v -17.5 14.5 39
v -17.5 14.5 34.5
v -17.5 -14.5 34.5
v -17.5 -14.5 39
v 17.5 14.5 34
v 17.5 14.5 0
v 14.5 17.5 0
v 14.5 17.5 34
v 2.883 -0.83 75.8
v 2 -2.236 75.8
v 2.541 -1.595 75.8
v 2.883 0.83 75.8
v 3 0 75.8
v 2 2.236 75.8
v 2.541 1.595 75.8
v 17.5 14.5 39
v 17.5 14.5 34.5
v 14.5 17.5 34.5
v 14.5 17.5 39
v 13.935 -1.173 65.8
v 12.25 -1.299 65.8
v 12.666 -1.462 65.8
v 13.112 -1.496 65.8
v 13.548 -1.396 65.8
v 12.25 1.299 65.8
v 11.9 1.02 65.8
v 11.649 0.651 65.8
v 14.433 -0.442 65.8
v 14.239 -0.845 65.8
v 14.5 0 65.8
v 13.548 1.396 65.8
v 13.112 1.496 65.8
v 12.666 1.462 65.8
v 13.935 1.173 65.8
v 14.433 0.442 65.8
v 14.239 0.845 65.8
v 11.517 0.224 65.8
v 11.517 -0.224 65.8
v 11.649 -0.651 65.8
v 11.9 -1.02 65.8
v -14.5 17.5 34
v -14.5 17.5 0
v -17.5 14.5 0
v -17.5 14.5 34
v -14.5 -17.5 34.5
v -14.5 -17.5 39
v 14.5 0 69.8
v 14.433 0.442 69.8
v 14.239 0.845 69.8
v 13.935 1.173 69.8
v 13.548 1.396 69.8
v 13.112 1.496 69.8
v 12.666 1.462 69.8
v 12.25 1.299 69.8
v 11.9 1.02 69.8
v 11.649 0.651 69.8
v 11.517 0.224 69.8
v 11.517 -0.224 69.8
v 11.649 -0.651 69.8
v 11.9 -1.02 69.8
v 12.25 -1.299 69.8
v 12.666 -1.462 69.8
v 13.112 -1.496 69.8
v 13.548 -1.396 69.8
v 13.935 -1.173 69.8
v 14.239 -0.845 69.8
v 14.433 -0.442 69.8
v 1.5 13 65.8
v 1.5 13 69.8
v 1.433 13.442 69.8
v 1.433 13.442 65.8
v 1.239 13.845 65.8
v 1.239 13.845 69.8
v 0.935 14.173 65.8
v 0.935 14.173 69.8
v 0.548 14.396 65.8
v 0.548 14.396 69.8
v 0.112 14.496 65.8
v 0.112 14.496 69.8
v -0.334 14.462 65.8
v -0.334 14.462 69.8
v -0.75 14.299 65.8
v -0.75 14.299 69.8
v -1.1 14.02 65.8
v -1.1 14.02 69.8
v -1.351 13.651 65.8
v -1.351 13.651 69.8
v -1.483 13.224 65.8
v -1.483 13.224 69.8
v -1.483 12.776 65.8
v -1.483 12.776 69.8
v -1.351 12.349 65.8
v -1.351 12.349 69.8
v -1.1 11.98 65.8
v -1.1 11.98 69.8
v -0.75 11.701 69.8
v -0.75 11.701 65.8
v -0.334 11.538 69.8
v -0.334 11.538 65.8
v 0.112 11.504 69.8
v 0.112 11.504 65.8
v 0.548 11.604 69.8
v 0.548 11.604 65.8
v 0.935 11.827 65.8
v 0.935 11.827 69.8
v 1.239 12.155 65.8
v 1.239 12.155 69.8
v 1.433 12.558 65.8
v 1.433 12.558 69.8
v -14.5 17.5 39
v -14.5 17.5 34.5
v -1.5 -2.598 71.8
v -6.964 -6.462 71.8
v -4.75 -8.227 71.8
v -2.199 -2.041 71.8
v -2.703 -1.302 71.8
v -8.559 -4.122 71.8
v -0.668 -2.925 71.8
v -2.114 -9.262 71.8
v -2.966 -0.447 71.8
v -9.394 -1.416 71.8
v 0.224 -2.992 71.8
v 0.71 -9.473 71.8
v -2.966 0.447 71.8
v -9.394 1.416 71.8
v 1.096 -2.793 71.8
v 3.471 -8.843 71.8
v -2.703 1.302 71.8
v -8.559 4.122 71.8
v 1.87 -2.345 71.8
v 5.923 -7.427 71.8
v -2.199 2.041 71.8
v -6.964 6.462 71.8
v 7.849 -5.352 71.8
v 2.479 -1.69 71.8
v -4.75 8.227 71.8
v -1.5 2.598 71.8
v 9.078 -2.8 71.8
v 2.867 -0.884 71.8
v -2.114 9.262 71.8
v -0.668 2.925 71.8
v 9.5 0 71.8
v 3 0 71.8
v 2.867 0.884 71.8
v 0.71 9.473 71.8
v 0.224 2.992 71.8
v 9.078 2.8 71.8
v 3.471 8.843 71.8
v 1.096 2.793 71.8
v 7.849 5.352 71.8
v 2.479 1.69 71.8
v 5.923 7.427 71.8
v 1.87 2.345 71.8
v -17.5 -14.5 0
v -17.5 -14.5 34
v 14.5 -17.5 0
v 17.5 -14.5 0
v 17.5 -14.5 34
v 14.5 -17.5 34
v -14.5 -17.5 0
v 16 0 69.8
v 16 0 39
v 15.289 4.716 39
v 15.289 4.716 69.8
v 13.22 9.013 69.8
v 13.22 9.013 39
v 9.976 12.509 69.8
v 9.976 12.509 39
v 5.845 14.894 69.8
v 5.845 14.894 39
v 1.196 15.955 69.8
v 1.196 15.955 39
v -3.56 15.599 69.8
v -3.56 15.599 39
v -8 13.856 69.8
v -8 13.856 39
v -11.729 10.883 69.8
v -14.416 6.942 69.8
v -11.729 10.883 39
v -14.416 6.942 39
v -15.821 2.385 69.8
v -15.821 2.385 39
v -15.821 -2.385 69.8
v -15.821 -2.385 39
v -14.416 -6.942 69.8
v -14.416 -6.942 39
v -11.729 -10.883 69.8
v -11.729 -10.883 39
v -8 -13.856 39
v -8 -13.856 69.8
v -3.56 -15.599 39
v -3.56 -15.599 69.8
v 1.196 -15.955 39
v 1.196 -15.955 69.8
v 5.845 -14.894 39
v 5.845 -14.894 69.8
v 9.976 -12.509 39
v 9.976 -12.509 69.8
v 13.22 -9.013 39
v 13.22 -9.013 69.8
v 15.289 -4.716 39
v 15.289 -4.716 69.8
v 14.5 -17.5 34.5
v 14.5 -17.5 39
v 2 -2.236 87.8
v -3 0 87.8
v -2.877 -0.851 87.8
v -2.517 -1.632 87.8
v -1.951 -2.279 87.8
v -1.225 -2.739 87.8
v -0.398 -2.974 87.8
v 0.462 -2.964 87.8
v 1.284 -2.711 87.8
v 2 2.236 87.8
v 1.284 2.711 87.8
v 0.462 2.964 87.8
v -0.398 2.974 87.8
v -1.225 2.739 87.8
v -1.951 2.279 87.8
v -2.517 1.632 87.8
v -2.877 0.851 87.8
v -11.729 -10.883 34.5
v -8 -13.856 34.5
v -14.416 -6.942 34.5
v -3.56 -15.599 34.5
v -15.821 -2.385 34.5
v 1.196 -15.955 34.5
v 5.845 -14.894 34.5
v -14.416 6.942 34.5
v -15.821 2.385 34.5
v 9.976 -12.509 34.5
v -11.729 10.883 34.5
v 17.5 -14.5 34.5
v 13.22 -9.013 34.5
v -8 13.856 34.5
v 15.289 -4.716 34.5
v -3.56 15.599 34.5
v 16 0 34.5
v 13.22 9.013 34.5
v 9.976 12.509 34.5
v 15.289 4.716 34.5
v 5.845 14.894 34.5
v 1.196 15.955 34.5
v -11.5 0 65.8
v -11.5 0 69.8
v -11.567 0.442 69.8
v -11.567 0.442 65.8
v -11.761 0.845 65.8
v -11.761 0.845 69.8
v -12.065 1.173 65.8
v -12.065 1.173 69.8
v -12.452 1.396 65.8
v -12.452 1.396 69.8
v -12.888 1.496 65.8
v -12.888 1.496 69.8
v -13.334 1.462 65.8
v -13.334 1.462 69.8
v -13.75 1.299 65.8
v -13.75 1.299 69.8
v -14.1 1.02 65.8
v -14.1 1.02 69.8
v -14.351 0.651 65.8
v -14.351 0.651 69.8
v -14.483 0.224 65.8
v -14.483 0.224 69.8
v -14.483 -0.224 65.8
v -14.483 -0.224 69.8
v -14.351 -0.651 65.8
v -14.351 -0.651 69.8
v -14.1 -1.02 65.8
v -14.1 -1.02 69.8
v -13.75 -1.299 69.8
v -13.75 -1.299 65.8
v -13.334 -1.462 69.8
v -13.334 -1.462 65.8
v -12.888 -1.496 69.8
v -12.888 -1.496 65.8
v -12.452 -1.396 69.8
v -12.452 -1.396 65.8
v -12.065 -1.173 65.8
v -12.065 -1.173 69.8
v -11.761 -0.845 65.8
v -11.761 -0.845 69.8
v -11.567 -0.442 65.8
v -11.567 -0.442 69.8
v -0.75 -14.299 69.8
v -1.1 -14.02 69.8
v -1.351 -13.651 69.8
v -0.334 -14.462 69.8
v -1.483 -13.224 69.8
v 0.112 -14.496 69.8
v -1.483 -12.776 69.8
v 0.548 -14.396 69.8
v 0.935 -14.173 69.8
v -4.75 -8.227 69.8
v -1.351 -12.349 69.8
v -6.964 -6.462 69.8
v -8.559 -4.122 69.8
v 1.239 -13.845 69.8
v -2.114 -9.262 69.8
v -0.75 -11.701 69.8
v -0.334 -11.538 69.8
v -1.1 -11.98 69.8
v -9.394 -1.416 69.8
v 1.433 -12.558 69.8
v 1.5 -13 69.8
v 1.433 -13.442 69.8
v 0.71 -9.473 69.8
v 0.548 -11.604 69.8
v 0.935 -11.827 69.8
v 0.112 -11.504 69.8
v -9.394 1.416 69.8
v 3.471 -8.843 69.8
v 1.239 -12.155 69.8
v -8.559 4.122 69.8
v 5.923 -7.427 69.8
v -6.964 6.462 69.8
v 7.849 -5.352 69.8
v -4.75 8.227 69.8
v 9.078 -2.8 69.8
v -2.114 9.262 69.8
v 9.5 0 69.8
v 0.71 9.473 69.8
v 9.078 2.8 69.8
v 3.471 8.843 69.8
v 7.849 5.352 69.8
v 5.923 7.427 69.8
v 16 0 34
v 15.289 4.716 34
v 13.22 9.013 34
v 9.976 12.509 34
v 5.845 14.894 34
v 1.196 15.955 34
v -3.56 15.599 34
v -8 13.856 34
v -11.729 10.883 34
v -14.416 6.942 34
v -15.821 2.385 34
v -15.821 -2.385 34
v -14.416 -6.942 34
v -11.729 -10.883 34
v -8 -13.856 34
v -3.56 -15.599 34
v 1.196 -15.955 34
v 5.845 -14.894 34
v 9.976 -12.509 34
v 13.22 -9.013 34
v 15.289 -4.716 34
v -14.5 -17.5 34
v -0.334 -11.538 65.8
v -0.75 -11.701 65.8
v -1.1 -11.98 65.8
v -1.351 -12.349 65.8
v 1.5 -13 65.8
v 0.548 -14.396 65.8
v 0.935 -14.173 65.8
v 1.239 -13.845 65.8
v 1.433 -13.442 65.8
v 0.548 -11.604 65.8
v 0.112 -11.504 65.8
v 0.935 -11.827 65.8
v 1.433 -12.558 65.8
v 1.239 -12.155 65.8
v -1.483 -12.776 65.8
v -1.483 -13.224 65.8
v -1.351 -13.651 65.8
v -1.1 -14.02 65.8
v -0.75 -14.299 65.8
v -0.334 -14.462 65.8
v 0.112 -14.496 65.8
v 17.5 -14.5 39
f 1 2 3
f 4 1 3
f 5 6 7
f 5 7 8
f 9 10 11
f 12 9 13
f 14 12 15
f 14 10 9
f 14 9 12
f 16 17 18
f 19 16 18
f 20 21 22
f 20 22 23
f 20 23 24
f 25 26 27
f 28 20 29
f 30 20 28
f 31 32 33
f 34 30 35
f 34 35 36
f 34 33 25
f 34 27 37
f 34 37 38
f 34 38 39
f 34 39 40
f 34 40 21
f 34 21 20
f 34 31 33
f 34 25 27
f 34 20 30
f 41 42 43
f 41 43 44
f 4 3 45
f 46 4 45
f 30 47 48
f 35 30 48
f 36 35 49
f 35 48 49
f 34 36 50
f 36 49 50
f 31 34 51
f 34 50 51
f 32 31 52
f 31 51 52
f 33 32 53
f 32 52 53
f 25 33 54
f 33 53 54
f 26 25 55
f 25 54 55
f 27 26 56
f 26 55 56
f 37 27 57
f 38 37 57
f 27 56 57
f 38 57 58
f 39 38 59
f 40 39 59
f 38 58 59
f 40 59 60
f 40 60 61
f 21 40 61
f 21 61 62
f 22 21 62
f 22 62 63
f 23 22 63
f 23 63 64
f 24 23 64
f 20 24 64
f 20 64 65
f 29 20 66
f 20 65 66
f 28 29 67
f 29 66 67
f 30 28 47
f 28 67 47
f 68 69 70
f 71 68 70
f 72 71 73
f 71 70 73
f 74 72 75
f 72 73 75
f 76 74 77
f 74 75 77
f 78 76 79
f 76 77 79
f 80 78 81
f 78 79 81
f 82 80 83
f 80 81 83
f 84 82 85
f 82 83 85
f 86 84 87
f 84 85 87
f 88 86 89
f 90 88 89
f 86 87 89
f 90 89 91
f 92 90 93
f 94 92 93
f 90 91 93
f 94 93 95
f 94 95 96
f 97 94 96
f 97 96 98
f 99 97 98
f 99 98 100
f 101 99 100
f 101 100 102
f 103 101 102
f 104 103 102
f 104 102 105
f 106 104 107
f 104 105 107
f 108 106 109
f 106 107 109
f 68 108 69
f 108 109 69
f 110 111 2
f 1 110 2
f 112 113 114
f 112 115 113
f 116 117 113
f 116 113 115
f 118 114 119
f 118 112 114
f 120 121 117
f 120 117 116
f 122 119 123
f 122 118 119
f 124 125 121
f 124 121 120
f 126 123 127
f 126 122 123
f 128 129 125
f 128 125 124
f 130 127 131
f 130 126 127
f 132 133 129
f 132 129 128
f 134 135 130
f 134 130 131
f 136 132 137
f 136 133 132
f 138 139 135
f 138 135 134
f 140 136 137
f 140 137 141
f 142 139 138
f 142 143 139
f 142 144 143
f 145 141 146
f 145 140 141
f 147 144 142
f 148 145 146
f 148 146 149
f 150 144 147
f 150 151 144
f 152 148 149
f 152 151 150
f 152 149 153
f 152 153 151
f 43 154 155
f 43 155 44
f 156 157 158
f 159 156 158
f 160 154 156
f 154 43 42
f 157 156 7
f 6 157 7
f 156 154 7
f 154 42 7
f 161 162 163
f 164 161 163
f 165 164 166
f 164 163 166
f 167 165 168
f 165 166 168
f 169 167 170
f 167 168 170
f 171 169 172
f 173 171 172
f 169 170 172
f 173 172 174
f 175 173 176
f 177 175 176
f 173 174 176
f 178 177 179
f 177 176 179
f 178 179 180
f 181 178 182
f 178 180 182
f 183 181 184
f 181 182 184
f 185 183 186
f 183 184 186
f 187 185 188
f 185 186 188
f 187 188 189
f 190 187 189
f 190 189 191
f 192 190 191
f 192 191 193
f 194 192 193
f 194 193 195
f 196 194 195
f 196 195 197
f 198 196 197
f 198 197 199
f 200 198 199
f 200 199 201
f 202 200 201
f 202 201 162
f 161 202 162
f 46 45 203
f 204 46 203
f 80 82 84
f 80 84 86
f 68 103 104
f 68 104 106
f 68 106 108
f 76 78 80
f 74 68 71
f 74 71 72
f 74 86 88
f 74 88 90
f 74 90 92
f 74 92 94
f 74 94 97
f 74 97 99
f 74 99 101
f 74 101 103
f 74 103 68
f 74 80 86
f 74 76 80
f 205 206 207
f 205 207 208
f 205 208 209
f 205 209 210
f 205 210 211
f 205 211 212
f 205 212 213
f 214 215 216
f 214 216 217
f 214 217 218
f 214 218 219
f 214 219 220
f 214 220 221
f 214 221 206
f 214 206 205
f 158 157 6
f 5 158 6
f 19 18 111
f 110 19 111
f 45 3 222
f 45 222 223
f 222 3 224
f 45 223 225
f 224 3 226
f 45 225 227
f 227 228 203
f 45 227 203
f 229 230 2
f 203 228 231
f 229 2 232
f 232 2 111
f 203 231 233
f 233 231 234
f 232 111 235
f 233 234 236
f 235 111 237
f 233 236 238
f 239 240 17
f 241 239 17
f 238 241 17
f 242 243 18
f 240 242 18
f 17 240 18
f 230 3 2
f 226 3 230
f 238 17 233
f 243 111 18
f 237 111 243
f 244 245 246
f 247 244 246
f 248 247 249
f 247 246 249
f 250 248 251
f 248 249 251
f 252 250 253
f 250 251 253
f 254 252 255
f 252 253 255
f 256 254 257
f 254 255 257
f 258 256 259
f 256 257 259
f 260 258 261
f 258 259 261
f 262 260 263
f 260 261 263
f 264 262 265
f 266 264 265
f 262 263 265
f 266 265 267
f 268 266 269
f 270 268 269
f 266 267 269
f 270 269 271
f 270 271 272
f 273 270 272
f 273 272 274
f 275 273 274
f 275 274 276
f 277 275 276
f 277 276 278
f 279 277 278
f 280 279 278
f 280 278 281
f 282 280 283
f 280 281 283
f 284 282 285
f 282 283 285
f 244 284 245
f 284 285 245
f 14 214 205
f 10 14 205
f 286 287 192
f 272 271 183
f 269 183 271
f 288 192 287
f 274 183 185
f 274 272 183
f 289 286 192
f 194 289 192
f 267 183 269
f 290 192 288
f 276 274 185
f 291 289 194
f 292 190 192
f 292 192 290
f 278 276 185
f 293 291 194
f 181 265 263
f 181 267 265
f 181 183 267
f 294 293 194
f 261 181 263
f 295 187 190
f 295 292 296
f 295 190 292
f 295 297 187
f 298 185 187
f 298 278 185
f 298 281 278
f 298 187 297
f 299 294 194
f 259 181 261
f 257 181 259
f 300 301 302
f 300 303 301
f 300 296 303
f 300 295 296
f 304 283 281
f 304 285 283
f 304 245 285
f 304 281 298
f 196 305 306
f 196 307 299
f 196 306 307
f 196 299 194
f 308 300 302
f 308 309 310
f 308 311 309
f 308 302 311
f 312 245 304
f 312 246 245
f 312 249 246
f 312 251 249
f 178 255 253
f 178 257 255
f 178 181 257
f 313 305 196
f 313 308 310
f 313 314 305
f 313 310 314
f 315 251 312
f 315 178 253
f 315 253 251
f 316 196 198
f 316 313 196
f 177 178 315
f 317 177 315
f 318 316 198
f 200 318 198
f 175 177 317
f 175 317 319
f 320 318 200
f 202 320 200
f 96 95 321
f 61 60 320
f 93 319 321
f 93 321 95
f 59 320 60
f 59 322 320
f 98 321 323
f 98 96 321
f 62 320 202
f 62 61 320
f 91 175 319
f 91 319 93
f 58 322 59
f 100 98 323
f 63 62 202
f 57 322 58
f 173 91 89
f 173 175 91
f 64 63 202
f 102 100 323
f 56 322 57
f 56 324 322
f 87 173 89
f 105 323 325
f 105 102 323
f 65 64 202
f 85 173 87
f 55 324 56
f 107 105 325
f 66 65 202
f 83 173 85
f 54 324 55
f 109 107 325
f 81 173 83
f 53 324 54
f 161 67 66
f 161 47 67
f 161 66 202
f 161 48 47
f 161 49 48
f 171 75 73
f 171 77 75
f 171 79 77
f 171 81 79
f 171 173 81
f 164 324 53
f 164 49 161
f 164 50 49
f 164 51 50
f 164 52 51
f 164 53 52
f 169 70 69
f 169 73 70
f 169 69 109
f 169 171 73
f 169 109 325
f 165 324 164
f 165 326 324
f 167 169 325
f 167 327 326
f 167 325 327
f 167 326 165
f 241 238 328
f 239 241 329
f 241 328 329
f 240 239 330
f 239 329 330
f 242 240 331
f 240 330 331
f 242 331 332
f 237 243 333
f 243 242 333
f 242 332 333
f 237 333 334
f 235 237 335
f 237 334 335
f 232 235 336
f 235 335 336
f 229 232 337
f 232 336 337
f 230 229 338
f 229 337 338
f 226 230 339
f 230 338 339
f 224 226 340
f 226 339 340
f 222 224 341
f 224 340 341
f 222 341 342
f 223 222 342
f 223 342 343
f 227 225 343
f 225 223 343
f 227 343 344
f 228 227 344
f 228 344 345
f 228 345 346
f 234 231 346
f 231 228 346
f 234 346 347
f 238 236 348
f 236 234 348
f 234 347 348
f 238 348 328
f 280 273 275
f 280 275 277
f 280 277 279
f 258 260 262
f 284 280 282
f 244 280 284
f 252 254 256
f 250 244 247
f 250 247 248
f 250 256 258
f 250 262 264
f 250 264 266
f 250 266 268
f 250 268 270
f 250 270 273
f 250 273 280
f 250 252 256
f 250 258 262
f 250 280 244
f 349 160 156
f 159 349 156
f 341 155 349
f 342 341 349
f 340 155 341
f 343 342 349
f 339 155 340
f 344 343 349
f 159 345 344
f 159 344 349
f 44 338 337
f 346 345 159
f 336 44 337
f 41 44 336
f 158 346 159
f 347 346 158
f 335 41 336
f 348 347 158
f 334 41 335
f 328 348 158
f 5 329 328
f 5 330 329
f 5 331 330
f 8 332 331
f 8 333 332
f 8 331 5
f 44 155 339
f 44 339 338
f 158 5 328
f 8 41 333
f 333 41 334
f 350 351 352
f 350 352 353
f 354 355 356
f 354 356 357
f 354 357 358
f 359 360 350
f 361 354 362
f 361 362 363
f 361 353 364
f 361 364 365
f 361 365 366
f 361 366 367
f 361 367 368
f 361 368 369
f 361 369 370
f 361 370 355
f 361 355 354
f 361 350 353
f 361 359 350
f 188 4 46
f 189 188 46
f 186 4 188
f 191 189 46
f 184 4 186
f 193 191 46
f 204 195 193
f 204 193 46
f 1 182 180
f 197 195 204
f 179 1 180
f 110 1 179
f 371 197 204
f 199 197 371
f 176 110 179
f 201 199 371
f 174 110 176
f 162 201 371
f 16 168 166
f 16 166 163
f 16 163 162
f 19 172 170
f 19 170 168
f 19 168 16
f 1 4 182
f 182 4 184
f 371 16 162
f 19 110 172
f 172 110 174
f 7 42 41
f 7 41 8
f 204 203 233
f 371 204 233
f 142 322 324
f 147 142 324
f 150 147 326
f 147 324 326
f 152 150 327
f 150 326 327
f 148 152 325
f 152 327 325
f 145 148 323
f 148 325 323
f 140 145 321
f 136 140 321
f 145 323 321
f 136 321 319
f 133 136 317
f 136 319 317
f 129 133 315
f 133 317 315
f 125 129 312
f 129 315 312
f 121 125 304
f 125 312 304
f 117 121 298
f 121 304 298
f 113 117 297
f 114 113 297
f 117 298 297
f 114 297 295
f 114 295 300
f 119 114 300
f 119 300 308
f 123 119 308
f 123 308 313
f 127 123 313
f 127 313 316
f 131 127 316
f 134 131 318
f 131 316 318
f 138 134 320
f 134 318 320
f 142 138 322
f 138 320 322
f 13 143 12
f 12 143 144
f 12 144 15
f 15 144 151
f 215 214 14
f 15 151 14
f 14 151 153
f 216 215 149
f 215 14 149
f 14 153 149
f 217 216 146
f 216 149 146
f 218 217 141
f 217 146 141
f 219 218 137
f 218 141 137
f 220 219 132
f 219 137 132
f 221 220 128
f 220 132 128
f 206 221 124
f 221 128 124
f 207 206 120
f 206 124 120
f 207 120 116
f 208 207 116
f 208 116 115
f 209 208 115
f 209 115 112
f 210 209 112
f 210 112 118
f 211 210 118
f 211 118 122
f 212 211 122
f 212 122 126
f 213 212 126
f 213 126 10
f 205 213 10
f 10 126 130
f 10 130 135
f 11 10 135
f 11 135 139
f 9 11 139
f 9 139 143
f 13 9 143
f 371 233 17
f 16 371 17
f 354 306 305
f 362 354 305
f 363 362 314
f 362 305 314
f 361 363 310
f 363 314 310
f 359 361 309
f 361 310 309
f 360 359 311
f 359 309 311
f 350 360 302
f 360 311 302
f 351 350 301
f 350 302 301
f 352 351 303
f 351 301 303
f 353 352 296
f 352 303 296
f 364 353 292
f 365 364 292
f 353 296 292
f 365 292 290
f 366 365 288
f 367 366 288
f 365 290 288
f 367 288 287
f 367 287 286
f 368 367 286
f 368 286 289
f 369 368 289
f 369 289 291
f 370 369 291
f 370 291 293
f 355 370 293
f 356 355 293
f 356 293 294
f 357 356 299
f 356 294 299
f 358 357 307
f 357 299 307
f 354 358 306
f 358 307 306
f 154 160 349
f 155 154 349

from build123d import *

# Parameters (mm, degrees)
SKIZZE1_W                       = 35
SKIZZE1_H                       = 35
AUFSATZ_LINEAR_AUSTRAGEN1_DEPTH = 34
SKIZZE2_R                       = 16
AUFSATZ_LINEAR_AUSTRAGEN2_DEPTH = 35.8
SKIZZE3_R                       = 9.5
AUFSATZ_LINEAR_AUSTRAGEN3_DEPTH = 2
SKIZZE4_R                       = 3
AUFSATZ_LINEAR_AUSTRAGEN4_DEPTH = 18
SKIZZE5_R                       = 1.5
SCHNITT_LINEAR_AUSTRAGEN1_DEPTH = 4
FASE1_SIZE                      = 3
AUFSATZ_LINEAR_START            = 0.5
AUFSATZ_LINEAR_AUSTRAGEN5_DEPTH = 4.5
SCHNITT_LINEAR_START            = -12
SCHNITT_LINEAR_AUSTRAGEN2_DEPTH = 12


with BuildPart() as part:
    # Skizze1 → Aufsatz-Linear austragen1 (new body)
    with BuildSketch(Plane.XY):
        Rectangle(SKIZZE1_W, SKIZZE1_H)
    extrude(amount=AUFSATZ_LINEAR_AUSTRAGEN1_DEPTH)

    # Skizze2 → Aufsatz-Linear austragen2 (add)
    with BuildSketch(Plane.XY.offset(34)):
        Circle(SKIZZE2_R)
    extrude(amount=AUFSATZ_LINEAR_AUSTRAGEN2_DEPTH)

    # Skizze3 → Aufsatz-Linear austragen3 (add)
    with BuildSketch(Plane.XY.offset(69.8)):
        Circle(SKIZZE3_R)
    extrude(amount=AUFSATZ_LINEAR_AUSTRAGEN3_DEPTH)

    # Skizze4 → Aufsatz-Linear austragen4 (add)
    with BuildSketch(Plane.XY.offset(69.8)):
        Circle(SKIZZE4_R)
    extrude(amount=AUFSATZ_LINEAR_AUSTRAGEN4_DEPTH)

    # Skizze5 → Schnitt-Linear austragen1 (cut)
    with BuildSketch(Plane.XY.offset(69.8)):
        with Locations((0, 13)):
            Circle(SKIZZE5_R)
        with Locations((13, 0)):
            Circle(SKIZZE5_R)
        with Locations((-13, 0)):
            Circle(SKIZZE5_R)
        with Locations((0, -13)):
            Circle(SKIZZE5_R)
    extrude(amount=-SCHNITT_LINEAR_AUSTRAGEN1_DEPTH, mode=Mode.SUBTRACT)

    # Fase1
    fase1_edges = [part.edges().sort_by_distance(p)[0] for p in [
        (-17.5, -17.5, 17),
        (17.5, -17.5, 17),
        (-17.5, 17.5, 17),
        (17.5, 17.5, 17),
    ]]
    chamfer(fase1_edges, length=FASE1_SIZE)

    # Skizze6 → Aufsatz-Linear austragen5 (add)
    with BuildSketch(Plane.XY.offset(34).offset(AUFSATZ_LINEAR_START)):
        Polygon((-17.5, 14.5), (-17.5, -14.5), (-14.5, -17.5), (14.5, -17.5), (17.5, -14.5), (17.5, 14.5), (14.5, 17.5), (-14.5, 17.5), align=None)
    extrude(amount=AUFSATZ_LINEAR_AUSTRAGEN5_DEPTH)

    # Skizze7 → Schnitt-Linear austragen2 (cut)
    with BuildSketch(Plane.XY.offset(87.8).offset(SCHNITT_LINEAR_START)):
        with BuildLine():
            Line((2, 2.236067977), (2, -2.236067977))
            ThreePointArc((2, -2.236067977), (3, 0), (2, 2.236067977))
        make_face()
    extrude(amount=SCHNITT_LINEAR_AUSTRAGEN2_DEPTH, mode=Mode.SUBTRACT)


solid = part.part
